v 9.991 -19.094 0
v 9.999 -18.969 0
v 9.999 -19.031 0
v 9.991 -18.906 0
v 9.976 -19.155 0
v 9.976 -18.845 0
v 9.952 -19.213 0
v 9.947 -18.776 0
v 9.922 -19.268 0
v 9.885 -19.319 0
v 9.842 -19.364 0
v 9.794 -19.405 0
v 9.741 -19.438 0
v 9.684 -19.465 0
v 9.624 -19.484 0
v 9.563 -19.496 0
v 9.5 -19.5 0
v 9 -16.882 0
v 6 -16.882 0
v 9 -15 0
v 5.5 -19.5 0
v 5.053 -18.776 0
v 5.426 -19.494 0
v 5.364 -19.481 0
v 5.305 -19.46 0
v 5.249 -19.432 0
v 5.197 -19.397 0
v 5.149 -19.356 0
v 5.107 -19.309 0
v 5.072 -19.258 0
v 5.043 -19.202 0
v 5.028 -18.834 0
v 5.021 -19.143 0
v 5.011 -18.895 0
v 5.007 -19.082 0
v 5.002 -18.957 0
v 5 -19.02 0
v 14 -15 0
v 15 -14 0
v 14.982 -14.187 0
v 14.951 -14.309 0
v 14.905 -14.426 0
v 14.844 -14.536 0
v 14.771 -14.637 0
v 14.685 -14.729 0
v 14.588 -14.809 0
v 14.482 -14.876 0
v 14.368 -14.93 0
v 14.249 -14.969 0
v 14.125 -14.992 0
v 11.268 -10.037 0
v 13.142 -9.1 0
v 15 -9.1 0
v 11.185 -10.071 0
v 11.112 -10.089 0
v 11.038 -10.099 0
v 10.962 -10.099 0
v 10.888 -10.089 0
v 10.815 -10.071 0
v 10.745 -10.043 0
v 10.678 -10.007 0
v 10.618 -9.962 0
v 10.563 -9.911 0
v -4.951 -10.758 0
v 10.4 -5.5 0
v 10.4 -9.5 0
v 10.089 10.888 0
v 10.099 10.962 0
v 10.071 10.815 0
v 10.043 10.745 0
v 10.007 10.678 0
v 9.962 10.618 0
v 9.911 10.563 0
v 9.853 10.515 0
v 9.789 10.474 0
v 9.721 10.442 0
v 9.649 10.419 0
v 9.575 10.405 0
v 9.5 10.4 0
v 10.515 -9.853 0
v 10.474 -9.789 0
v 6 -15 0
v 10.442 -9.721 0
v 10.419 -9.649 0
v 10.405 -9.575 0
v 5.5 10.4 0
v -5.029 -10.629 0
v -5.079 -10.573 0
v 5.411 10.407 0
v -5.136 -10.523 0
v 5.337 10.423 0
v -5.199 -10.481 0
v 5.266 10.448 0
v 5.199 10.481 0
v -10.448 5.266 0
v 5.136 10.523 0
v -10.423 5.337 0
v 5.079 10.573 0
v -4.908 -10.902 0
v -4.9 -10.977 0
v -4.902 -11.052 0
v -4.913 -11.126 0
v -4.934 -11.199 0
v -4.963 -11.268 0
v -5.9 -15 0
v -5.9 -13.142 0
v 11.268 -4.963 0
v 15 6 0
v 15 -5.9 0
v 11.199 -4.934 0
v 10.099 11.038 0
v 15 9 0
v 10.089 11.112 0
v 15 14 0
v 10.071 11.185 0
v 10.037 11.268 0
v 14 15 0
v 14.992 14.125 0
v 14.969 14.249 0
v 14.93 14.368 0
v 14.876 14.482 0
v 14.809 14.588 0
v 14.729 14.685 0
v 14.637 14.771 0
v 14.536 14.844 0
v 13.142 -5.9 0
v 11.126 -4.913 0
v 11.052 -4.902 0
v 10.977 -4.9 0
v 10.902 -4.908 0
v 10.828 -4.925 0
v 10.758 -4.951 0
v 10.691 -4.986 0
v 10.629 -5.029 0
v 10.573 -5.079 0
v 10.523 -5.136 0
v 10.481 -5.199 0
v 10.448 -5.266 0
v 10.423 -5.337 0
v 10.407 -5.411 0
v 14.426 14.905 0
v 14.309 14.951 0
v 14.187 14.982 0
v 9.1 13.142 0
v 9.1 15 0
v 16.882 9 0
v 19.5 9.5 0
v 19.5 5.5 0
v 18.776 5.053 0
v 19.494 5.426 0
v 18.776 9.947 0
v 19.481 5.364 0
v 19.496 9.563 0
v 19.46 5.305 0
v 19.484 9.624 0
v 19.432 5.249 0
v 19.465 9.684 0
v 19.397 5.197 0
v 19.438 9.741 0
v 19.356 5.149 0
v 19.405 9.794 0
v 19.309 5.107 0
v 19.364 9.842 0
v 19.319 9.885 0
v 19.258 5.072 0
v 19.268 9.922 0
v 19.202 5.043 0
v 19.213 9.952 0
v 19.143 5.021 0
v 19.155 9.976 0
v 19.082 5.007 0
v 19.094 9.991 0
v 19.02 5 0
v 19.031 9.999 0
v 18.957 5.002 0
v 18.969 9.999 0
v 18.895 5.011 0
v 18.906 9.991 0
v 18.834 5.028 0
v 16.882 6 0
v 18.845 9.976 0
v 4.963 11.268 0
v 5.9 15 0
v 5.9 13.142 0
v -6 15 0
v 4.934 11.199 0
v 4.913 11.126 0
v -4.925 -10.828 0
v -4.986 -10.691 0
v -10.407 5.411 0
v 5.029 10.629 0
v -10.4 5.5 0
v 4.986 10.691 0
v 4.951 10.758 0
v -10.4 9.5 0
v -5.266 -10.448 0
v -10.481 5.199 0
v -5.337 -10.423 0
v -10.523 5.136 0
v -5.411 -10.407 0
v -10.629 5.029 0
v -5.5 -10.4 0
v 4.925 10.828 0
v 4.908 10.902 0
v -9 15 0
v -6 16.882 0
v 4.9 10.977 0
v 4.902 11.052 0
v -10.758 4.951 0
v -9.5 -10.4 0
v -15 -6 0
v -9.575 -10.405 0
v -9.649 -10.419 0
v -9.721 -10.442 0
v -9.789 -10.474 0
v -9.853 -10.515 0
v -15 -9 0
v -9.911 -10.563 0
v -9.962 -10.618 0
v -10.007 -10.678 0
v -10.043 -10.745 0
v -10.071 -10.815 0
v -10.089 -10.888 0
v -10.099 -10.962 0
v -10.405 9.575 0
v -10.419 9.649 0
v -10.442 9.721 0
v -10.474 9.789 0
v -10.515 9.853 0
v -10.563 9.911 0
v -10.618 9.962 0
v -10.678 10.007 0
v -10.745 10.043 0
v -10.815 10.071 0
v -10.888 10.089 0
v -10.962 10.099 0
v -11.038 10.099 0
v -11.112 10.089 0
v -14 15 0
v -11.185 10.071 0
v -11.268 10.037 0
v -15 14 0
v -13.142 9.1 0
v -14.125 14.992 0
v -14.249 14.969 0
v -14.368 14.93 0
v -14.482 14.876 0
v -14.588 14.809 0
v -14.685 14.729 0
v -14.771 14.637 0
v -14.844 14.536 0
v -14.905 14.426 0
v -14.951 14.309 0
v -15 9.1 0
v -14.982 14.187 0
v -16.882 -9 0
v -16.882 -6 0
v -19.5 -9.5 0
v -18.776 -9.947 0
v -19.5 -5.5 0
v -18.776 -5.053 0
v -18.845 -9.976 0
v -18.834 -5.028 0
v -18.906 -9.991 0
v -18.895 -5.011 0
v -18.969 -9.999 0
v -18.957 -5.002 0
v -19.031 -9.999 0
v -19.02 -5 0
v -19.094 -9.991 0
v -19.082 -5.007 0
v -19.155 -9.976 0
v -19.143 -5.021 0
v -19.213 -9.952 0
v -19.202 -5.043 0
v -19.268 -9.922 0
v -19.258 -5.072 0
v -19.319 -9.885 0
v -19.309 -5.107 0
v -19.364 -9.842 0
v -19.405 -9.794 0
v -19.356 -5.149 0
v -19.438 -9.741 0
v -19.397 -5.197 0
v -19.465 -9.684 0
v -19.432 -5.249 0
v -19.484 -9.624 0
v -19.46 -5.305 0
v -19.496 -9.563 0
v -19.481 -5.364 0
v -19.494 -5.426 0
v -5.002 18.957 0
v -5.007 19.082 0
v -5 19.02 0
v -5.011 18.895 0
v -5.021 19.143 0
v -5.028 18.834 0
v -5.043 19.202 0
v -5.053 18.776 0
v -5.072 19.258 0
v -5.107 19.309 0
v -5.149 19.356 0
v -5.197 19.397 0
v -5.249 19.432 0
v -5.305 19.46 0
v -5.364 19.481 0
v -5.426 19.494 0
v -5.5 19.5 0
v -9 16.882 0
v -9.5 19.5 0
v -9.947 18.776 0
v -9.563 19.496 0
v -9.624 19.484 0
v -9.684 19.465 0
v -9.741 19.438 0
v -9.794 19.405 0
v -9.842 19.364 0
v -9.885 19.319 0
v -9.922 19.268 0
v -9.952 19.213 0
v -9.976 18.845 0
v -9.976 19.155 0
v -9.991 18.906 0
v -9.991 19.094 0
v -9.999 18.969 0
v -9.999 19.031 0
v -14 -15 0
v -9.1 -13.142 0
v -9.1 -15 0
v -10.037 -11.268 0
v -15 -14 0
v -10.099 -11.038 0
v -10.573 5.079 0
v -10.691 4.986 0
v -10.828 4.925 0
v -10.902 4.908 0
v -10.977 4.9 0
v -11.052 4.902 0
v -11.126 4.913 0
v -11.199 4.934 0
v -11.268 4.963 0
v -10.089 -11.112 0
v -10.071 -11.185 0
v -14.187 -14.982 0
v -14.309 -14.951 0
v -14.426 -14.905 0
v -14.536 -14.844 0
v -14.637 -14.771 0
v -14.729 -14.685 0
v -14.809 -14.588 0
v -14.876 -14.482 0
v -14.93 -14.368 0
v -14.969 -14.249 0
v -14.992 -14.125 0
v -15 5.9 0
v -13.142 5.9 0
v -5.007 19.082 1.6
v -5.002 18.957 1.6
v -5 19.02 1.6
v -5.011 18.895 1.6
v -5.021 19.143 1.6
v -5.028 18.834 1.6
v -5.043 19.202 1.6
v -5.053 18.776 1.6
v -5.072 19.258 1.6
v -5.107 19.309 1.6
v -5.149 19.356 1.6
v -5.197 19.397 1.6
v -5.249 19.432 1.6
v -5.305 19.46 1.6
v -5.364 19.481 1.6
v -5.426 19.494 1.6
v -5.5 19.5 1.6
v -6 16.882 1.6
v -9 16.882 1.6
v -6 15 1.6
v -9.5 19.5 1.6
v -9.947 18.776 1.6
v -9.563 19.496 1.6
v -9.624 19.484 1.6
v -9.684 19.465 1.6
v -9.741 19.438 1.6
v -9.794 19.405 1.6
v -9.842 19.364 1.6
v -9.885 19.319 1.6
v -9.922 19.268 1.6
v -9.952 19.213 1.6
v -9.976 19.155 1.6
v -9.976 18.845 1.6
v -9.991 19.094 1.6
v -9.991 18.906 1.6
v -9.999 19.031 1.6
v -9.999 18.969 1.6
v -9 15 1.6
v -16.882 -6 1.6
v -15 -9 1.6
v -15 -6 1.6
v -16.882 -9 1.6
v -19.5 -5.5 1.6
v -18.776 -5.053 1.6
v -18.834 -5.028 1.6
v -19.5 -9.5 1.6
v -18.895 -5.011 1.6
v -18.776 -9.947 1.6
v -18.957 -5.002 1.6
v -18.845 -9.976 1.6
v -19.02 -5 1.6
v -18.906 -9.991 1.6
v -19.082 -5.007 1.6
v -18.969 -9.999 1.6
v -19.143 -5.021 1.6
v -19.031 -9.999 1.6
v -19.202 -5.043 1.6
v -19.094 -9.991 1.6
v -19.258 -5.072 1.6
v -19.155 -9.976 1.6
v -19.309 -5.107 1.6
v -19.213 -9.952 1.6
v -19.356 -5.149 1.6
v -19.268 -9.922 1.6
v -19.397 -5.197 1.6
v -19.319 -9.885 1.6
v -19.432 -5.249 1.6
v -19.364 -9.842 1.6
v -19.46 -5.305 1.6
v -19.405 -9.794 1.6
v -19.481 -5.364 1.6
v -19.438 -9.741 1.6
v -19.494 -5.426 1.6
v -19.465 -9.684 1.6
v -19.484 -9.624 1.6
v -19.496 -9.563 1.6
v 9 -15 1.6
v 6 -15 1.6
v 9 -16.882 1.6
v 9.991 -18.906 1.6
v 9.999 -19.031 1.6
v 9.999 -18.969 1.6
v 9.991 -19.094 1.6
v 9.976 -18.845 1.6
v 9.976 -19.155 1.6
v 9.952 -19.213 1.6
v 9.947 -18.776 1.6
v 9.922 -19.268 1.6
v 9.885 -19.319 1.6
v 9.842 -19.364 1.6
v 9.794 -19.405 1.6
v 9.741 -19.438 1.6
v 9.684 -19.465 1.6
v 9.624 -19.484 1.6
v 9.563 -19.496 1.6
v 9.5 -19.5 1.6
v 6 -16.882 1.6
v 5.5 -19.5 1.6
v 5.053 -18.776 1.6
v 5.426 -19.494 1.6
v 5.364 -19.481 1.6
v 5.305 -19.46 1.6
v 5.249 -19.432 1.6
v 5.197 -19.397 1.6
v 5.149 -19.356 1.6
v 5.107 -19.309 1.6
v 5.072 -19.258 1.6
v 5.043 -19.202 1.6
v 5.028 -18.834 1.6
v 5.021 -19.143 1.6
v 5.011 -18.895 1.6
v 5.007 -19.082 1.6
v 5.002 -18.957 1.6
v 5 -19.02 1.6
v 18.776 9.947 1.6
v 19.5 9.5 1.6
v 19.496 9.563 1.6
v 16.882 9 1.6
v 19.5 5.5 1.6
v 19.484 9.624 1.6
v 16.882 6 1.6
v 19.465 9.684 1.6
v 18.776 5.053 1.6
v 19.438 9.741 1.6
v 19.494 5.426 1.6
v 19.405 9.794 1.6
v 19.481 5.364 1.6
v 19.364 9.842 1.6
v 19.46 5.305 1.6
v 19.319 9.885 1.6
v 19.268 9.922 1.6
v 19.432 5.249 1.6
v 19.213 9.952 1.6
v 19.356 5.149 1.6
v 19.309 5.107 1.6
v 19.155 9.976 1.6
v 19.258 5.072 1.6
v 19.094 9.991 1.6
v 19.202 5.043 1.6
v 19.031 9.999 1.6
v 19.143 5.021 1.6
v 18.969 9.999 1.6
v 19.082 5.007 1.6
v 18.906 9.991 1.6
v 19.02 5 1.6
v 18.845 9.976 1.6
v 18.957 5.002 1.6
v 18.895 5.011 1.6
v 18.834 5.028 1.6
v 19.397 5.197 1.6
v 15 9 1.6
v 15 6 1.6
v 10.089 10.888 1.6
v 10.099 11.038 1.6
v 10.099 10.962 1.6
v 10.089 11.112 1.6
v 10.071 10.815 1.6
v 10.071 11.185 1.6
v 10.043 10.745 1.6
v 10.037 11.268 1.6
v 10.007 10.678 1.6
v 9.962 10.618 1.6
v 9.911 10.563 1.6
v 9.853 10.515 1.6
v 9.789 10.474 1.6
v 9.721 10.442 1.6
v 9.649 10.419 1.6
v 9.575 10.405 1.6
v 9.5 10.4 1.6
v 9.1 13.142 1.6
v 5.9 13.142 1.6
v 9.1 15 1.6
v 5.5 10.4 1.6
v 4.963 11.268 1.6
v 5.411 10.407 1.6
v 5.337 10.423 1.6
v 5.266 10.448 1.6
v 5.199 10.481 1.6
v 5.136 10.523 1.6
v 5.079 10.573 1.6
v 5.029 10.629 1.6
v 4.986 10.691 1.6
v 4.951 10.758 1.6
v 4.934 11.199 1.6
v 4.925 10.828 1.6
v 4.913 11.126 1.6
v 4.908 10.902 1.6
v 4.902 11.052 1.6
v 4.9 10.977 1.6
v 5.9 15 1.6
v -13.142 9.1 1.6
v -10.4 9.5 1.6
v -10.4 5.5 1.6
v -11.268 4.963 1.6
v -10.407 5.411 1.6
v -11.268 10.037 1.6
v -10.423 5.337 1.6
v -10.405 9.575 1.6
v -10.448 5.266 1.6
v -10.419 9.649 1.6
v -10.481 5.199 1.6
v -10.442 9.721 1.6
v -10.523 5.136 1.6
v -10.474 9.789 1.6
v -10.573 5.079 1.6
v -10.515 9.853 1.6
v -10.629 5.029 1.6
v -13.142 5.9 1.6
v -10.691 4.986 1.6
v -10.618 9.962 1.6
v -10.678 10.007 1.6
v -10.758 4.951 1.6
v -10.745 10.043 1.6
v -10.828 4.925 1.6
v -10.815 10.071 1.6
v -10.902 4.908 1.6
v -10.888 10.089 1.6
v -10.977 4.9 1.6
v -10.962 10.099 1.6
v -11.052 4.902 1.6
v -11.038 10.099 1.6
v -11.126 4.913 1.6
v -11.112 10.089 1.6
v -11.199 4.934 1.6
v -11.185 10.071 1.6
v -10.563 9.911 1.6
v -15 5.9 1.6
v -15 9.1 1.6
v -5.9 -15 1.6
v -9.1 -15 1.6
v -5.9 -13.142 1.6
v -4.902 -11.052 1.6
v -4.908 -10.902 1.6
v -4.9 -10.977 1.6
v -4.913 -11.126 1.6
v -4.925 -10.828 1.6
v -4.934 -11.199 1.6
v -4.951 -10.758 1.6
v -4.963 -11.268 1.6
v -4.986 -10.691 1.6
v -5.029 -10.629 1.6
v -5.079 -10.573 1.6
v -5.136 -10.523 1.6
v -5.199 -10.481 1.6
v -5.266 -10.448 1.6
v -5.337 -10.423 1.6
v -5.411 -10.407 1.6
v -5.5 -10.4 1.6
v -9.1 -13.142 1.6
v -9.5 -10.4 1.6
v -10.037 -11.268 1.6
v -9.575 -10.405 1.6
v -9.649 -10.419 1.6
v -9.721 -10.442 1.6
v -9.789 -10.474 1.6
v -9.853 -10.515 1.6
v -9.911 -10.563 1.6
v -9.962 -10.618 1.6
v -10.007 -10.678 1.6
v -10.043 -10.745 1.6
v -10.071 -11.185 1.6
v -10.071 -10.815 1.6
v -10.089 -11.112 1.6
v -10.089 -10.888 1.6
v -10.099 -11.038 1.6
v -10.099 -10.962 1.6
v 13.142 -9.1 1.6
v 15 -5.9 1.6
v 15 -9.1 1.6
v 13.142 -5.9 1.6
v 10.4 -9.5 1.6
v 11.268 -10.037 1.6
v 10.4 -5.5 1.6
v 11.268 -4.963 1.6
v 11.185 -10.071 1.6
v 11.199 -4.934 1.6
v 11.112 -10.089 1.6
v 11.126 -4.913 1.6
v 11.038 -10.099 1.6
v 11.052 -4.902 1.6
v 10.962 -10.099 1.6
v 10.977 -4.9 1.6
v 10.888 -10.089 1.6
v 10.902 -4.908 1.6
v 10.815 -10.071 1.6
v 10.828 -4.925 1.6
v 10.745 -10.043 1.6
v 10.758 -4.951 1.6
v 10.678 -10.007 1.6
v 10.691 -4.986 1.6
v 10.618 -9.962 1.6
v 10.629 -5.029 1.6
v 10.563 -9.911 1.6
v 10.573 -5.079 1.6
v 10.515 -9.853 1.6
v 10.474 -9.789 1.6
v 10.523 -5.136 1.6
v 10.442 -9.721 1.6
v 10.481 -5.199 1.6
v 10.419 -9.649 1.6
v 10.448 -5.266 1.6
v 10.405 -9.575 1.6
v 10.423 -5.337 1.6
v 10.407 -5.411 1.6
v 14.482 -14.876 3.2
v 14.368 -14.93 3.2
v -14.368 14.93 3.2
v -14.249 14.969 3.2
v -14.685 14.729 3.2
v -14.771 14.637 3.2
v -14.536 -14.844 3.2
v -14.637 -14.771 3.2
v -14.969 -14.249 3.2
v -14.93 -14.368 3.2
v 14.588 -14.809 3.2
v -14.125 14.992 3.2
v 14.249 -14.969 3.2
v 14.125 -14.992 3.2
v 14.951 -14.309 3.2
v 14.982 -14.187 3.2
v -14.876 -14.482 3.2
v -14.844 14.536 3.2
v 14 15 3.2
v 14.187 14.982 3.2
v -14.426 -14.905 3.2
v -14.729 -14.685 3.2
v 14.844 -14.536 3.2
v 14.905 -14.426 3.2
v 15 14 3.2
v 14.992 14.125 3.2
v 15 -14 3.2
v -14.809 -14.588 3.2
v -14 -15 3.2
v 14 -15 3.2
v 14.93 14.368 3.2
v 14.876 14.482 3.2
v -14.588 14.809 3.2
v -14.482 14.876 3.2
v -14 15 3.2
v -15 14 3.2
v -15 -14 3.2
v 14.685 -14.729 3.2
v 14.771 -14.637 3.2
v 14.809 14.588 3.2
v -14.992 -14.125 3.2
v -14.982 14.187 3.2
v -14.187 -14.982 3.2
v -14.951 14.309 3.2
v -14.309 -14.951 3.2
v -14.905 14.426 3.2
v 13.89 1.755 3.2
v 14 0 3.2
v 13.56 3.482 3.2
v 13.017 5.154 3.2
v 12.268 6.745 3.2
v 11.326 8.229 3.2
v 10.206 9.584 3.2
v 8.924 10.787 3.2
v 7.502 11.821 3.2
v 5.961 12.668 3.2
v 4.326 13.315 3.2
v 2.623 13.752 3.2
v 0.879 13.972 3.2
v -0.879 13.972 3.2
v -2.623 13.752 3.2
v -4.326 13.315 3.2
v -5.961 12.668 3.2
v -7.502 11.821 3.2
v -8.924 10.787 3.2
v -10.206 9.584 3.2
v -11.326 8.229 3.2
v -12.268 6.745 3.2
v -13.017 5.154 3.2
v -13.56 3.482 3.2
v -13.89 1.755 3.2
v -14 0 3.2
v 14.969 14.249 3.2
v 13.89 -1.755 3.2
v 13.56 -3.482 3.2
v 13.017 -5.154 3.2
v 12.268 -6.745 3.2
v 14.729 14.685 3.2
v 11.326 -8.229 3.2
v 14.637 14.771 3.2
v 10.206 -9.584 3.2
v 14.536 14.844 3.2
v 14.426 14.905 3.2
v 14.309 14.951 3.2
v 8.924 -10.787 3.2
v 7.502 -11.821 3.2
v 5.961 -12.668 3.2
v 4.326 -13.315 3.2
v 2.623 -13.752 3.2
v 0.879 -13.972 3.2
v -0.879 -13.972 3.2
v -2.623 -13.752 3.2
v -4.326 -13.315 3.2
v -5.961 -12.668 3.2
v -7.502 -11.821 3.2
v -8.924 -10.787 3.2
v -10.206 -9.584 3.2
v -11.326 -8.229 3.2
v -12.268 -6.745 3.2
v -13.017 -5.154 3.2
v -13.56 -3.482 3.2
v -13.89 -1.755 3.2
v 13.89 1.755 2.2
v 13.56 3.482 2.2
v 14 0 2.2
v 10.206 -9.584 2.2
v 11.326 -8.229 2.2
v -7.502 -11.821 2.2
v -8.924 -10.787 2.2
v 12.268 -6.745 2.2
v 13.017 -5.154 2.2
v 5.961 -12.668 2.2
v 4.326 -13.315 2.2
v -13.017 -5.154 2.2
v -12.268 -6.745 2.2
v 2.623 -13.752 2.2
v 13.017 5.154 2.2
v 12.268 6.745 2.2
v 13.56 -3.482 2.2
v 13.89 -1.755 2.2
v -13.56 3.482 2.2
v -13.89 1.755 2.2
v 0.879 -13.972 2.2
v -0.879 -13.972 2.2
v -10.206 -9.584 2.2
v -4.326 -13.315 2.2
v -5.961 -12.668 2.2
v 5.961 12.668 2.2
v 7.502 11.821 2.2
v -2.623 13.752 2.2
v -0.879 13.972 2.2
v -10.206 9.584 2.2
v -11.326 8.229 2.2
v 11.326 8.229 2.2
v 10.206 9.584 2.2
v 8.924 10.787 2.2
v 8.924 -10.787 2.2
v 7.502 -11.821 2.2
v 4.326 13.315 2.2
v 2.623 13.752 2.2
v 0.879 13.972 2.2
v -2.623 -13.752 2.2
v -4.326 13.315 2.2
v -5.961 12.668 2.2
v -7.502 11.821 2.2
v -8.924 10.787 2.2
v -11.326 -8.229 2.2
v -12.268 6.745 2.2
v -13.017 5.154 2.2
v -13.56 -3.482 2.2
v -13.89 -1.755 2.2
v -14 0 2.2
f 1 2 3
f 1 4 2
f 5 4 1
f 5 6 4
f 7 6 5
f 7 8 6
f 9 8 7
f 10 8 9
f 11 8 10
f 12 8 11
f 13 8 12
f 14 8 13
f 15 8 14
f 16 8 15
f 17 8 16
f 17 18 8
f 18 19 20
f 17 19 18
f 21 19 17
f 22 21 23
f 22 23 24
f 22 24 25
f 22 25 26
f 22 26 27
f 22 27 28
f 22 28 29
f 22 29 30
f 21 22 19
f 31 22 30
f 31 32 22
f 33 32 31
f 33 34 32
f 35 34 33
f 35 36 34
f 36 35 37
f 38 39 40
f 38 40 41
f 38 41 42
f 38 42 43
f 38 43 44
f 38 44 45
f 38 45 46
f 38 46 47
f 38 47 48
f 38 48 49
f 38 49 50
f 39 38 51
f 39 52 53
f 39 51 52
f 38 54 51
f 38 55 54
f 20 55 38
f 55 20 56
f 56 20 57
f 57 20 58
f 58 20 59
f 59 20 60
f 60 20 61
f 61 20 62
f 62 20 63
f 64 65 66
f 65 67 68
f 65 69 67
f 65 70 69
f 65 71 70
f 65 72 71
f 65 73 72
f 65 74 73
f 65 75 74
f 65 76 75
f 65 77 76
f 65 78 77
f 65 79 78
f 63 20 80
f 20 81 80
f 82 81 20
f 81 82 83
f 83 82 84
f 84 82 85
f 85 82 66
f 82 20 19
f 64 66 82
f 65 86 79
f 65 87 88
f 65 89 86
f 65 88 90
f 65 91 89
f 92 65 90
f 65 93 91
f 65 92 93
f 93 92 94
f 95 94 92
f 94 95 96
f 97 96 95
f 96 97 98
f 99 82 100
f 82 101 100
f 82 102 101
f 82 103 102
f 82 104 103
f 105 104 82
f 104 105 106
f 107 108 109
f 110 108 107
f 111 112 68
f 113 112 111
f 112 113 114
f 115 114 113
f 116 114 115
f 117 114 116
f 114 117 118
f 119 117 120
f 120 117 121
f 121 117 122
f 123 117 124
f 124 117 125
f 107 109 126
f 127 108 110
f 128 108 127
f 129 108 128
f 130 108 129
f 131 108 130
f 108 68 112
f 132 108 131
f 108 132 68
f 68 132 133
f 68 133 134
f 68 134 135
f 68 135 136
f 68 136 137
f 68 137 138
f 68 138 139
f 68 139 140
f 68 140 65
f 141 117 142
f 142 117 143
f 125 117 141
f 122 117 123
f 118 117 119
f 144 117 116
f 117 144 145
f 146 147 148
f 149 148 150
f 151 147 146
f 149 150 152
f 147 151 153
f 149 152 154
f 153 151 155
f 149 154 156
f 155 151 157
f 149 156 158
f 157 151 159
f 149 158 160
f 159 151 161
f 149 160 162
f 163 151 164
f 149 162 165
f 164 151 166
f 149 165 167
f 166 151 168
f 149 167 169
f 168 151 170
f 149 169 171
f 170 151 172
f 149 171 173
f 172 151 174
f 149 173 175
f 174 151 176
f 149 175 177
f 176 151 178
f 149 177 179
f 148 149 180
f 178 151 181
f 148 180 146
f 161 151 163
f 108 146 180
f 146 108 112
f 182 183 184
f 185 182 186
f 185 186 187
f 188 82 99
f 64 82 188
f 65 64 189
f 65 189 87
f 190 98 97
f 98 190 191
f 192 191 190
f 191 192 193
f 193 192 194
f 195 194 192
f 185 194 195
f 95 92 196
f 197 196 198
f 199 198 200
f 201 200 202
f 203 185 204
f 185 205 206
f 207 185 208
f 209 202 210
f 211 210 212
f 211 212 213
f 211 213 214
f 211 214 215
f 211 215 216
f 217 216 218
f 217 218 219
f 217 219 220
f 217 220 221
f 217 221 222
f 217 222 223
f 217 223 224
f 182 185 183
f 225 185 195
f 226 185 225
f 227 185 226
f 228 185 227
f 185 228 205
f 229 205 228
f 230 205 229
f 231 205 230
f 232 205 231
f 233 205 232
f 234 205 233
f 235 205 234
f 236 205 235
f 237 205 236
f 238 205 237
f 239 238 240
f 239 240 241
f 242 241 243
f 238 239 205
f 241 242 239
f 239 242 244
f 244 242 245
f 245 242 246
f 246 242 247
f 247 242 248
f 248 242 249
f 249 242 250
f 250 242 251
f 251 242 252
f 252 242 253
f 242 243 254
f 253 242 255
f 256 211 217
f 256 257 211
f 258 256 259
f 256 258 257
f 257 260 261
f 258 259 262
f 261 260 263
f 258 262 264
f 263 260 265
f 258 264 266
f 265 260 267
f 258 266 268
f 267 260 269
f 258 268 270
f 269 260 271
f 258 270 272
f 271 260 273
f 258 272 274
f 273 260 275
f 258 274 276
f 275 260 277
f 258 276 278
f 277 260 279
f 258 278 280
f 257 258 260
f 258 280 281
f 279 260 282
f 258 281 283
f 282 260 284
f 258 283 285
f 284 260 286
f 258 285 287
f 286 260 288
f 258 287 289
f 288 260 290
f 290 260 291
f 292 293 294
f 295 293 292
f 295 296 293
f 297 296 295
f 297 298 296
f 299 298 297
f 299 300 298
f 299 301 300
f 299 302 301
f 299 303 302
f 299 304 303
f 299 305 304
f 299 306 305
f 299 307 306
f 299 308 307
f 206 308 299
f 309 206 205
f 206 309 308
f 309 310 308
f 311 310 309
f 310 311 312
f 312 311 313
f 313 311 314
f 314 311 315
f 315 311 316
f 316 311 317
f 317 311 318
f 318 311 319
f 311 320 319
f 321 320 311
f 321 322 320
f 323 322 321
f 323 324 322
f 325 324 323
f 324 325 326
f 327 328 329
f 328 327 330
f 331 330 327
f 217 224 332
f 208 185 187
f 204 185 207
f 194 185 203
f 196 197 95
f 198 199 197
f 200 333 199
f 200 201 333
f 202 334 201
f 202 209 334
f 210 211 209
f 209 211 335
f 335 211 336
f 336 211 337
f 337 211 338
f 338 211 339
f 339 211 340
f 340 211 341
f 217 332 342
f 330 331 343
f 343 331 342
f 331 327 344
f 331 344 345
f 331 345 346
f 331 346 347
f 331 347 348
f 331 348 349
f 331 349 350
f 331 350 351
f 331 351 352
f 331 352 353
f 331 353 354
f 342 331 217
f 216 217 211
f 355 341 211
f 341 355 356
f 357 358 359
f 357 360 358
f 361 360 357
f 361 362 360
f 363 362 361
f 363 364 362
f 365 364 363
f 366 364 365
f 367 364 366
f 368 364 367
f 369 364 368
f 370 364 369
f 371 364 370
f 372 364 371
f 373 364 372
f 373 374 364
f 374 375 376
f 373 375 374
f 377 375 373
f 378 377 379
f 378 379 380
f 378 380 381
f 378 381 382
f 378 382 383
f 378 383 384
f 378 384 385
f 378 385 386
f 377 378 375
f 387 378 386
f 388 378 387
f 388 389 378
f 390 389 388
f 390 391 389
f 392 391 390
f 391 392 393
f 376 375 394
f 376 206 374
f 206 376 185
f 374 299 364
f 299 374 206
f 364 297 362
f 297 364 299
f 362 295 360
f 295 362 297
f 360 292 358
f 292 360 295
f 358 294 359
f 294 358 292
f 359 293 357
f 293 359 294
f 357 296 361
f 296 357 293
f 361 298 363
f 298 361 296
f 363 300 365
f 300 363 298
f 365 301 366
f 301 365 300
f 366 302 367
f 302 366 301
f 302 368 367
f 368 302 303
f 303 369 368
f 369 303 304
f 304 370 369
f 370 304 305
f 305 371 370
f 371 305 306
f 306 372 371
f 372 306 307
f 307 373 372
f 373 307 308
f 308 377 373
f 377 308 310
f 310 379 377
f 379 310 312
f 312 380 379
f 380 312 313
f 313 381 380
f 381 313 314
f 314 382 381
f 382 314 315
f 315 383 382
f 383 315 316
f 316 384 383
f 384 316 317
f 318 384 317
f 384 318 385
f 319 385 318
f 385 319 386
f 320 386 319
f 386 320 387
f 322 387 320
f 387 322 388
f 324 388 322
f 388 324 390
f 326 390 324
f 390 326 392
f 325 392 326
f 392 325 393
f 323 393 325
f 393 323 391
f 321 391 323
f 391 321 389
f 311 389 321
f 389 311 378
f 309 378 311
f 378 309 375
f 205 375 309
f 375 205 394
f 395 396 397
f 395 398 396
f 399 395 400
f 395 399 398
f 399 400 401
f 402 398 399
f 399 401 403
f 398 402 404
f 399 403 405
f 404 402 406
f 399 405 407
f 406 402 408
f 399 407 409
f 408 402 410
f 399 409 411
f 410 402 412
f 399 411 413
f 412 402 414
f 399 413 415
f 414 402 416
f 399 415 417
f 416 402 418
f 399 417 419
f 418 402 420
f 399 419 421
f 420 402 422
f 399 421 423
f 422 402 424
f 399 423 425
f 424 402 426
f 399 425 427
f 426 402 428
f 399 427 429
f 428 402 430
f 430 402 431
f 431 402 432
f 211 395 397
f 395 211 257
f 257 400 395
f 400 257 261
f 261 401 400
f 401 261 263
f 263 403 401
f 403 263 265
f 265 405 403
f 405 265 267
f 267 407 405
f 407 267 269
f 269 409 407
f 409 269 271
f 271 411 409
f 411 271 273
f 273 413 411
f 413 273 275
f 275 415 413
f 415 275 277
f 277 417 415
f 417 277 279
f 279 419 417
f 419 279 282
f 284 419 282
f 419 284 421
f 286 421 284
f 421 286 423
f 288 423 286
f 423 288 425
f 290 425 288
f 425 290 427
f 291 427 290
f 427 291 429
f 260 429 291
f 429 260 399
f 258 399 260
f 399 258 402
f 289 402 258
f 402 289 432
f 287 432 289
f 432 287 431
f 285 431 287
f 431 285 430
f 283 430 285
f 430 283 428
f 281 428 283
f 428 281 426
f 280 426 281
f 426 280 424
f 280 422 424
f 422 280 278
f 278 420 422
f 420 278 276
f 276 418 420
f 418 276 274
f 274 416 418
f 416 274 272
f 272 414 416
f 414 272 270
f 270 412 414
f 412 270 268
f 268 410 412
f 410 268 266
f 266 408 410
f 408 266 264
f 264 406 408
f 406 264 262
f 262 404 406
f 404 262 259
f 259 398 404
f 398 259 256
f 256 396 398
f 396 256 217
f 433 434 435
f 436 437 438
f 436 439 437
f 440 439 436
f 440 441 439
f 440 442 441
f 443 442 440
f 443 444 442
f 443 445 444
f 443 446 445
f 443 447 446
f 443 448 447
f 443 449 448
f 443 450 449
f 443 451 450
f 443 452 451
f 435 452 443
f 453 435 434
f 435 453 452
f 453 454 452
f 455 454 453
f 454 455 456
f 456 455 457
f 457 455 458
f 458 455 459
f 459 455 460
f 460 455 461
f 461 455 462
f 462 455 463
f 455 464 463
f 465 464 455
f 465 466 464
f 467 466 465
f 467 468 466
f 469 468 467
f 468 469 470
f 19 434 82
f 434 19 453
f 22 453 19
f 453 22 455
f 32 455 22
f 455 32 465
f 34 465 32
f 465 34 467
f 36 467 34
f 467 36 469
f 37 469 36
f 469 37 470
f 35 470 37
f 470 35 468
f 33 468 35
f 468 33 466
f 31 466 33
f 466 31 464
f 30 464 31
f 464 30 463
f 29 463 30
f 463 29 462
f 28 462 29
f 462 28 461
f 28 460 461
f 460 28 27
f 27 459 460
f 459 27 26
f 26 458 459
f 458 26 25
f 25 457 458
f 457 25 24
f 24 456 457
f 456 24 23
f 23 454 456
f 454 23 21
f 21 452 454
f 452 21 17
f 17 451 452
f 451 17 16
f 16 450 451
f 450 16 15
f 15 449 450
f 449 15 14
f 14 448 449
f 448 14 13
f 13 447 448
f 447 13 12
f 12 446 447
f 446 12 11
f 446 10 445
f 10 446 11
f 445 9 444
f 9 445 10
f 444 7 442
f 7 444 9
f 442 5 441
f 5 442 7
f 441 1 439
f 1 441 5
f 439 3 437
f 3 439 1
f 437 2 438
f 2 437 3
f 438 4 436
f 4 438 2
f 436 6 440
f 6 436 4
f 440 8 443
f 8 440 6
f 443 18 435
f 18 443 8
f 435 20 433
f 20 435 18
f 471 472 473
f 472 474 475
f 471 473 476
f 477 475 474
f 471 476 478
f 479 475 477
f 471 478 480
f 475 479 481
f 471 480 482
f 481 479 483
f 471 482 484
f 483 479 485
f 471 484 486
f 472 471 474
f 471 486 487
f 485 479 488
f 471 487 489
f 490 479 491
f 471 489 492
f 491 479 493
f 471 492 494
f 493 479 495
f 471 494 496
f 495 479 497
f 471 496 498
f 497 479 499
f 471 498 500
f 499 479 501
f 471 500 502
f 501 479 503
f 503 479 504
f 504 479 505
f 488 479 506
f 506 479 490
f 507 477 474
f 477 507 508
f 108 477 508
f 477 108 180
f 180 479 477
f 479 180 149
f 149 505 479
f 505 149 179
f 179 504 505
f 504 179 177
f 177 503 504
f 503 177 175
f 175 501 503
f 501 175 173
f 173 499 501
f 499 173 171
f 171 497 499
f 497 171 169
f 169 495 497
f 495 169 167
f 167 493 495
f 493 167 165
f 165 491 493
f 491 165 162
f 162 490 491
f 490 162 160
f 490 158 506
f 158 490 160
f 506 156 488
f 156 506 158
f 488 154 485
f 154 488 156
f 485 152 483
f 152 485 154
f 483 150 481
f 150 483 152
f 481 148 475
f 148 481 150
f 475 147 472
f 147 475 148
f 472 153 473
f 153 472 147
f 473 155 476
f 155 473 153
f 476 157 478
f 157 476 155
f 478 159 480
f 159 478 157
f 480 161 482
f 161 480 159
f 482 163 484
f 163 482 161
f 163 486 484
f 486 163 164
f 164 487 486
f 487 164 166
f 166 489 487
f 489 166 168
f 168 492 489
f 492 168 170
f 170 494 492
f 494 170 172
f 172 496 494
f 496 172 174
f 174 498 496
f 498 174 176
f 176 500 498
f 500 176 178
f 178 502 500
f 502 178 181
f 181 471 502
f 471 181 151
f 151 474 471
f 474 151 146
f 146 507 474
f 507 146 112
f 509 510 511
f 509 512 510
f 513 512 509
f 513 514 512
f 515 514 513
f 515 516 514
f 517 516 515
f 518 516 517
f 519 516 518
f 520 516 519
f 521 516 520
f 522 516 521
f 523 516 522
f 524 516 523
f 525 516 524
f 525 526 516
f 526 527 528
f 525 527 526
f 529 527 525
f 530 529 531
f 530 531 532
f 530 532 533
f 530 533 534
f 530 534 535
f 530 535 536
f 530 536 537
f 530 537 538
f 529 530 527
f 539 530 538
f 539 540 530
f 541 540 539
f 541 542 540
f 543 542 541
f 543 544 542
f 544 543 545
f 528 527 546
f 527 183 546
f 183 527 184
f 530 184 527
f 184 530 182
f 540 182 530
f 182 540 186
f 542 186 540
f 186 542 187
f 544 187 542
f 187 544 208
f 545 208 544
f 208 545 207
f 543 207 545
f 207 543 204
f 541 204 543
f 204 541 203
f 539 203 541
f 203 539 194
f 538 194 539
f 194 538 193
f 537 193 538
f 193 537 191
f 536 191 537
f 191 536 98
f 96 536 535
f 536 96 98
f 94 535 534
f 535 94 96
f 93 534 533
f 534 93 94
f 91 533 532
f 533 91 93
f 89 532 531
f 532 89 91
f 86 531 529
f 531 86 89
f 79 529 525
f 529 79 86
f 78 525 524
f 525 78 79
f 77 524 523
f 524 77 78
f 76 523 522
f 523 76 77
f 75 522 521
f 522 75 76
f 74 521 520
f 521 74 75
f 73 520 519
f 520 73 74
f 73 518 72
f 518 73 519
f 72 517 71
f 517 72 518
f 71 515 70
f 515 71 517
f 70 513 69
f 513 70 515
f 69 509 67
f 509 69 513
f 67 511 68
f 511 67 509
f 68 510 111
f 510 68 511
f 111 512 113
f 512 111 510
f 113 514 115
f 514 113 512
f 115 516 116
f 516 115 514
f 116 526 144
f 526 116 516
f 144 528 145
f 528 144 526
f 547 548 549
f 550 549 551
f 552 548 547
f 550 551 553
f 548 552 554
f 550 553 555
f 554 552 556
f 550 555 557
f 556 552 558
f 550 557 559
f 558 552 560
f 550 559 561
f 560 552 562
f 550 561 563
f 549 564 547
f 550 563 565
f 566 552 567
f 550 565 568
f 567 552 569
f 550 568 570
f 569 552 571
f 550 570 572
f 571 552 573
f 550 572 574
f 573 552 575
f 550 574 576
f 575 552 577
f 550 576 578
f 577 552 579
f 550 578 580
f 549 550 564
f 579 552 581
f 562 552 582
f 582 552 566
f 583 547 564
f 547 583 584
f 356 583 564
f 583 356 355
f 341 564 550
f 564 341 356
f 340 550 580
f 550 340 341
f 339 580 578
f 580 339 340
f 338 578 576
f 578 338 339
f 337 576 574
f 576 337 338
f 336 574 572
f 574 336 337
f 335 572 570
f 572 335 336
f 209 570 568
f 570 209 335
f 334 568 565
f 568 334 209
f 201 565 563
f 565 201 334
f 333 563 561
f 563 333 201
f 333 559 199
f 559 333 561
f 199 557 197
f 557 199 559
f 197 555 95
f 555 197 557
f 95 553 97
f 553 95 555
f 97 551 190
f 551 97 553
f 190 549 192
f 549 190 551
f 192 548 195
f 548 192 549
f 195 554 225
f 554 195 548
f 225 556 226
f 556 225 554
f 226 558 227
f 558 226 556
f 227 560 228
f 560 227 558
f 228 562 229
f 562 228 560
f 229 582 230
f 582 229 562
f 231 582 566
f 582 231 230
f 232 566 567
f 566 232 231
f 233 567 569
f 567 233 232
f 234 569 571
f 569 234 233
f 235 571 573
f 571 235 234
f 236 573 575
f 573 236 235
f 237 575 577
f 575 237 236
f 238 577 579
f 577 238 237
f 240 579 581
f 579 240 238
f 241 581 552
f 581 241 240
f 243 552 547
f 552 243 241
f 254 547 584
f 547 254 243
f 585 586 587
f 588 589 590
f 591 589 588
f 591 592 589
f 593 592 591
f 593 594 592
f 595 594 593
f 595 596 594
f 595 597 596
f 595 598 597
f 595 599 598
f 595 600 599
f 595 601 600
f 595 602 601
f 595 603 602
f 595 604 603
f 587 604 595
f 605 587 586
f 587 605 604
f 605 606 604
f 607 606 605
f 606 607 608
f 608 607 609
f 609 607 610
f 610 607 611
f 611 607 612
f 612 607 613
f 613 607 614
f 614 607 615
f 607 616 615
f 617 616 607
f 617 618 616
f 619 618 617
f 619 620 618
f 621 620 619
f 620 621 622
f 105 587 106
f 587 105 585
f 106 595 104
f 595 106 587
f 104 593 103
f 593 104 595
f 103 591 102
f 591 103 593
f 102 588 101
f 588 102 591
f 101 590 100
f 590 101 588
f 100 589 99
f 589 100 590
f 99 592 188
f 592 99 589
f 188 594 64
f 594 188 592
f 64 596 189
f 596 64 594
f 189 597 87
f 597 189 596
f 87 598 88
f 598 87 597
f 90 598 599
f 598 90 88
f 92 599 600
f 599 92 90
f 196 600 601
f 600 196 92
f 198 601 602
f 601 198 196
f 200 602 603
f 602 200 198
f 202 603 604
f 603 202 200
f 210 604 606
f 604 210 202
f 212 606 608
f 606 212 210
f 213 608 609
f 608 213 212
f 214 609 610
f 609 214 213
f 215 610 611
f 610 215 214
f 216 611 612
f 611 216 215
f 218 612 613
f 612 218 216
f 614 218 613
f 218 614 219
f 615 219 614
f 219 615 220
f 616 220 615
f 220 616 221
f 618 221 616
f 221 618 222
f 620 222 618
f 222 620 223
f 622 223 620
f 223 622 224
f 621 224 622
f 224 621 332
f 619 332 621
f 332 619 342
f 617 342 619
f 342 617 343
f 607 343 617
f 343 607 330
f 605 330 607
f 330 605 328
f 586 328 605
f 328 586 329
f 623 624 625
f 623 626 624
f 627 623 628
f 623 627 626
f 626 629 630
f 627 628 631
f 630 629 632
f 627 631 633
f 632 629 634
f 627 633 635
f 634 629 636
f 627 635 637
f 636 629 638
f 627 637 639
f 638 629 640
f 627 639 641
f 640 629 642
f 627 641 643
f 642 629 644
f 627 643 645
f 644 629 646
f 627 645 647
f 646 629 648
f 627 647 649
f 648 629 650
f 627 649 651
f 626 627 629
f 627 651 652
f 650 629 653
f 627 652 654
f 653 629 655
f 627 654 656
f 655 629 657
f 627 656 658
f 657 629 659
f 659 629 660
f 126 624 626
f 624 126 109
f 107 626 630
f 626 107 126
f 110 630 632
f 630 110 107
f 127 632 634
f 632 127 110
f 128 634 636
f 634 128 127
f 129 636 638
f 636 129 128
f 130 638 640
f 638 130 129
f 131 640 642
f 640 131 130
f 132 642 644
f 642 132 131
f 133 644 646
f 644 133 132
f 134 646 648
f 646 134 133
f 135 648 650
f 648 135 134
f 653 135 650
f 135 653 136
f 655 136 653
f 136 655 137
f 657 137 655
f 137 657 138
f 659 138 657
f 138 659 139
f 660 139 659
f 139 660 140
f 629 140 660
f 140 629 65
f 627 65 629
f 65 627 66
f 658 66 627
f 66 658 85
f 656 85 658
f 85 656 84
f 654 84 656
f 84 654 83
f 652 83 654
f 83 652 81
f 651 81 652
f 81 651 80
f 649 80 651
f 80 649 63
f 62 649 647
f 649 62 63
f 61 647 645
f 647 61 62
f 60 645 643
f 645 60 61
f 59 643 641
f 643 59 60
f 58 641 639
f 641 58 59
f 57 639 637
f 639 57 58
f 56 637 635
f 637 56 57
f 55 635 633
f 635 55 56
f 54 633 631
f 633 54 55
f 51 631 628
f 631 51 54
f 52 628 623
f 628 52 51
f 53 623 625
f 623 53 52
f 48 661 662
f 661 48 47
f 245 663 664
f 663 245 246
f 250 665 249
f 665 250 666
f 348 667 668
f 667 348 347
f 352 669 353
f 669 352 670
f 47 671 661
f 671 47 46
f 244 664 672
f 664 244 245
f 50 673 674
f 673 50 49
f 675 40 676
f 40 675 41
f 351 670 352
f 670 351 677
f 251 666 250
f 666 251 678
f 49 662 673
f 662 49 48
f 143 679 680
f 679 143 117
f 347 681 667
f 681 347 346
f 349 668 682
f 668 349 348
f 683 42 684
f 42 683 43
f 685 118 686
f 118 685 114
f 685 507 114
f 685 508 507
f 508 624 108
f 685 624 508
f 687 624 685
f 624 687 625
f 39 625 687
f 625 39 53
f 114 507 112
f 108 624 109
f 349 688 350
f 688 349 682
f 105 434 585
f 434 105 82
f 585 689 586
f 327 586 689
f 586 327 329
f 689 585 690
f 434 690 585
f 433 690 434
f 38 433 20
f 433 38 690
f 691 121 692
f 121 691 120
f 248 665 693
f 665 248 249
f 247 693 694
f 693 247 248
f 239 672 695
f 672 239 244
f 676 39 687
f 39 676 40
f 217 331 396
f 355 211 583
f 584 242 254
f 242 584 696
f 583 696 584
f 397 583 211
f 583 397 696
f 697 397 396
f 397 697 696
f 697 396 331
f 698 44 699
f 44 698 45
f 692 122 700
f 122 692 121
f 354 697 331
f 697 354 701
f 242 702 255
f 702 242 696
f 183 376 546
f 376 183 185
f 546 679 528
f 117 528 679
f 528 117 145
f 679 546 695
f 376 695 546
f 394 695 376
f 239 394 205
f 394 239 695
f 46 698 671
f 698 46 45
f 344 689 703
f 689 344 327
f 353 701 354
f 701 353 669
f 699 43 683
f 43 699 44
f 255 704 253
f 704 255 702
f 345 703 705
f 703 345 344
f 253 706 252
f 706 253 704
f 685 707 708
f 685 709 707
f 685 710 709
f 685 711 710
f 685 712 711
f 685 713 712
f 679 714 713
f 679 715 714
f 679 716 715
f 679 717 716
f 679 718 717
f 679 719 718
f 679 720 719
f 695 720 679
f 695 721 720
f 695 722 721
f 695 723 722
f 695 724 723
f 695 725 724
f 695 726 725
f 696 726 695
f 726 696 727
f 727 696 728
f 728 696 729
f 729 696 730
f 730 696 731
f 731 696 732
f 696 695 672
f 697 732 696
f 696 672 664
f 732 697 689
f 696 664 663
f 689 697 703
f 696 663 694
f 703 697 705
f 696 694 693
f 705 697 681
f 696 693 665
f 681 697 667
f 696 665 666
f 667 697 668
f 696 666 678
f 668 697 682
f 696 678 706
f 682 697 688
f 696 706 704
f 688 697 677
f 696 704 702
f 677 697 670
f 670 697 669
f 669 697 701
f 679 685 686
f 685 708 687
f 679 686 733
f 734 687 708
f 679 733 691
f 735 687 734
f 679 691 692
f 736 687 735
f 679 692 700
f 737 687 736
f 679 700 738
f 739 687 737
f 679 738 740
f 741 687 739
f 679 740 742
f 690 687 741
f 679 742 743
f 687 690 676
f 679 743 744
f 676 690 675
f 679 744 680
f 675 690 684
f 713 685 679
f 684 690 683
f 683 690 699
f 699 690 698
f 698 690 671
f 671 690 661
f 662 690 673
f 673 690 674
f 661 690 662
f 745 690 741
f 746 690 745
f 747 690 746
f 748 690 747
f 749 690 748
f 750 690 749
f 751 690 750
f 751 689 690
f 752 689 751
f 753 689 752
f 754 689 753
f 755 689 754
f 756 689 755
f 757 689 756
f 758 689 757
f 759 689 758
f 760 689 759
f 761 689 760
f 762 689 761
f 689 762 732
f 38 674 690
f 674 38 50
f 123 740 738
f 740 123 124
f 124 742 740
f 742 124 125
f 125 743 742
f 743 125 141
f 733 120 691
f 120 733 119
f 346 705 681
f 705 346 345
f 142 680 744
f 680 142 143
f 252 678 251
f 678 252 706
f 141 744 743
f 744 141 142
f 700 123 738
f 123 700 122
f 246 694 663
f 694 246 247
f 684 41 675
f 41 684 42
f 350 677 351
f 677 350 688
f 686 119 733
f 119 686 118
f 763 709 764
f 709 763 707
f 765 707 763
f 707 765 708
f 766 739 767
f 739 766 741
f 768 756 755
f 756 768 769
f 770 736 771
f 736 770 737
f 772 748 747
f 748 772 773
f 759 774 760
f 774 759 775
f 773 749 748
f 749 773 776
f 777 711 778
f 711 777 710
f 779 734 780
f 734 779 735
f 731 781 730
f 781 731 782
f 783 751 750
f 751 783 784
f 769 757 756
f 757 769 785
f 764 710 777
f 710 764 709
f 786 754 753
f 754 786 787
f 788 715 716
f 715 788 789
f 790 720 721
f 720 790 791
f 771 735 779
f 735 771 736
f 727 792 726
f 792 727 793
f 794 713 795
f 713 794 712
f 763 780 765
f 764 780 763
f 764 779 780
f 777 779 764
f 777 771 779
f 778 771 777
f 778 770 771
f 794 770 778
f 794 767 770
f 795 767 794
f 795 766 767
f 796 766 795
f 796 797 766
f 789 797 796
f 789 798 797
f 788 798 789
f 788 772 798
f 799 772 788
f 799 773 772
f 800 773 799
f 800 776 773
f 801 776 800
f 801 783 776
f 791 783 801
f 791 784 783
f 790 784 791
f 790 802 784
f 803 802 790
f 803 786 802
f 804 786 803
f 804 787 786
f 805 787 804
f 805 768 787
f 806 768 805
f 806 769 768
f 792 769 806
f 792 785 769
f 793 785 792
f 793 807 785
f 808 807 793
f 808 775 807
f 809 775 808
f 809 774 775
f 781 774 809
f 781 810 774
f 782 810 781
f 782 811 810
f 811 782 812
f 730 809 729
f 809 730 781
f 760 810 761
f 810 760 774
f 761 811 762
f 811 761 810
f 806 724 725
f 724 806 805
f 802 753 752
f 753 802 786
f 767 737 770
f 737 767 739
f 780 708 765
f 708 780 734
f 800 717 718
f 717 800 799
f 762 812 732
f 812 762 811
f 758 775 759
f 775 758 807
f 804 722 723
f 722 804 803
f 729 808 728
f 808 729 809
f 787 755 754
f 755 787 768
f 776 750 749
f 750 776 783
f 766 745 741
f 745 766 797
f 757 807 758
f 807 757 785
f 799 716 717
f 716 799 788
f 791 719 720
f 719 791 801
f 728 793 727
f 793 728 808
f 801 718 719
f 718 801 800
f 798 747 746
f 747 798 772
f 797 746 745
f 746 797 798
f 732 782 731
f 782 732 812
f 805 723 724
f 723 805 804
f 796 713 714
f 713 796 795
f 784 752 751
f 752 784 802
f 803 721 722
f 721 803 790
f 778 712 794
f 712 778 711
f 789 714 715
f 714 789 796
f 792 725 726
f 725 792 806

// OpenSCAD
// file: variables.scad
BODY_RADIUS = 12.5;
BODY_HEIGHT = 5;
BODY_PADDING = 0.8;
RING_WIDTH = 1.8;
RING_HEIGHT = 1;
RING_ROUND = 0.8;
RING_COUNT = 4;
RING_STEP = BODY_RADIUS / RING_COUNT;

TILE_CIRCLE_RADIUS = 14;
TILE_CIRCLE_DEPTH = 1;
TILE_HEIGHT = 3.2;
TILE_SIZE = 30;
CLIP_CORNER_RADIUS = 0.5;
CLIP_HEIGHT = TILE_HEIGHT/2;
CLIP_LENGTH = 4;
CLIP_WIDTH = 2;
CLIP_CAP_WIDTH = 4;
CLIP_CAP_LENGTH = 2;
// main file
/*
Print settings
  layer height: 0.2
*/

include <variables.scad>;

$fn=50;

module clip(r = CLIP_CORNER_RADIUS) {
  linear_extrude(CLIP_HEIGHT)
    offset(r = r)
        polygon([
          [-CLIP_WIDTH / 2, 0],
          [-CLIP_WIDTH / 2, CLIP_LENGTH - CLIP_CAP_LENGTH],
          [-CLIP_CAP_WIDTH / 2, CLIP_LENGTH],
          [CLIP_CAP_WIDTH / 2, CLIP_LENGTH],
          [CLIP_WIDTH / 2, CLIP_LENGTH - CLIP_CAP_LENGTH],
          [CLIP_WIDTH / 2, 0]
        ]);
}

module tile() {
  for (a=[0:90:270]) rotate([0, 0, a]) translate([-TILE_SIZE/4, TILE_SIZE/2, 0]) clip();
  difference() {
    translate([-TILE_SIZE/2, -TILE_SIZE/2, 0]) linear_extrude(TILE_HEIGHT) offset(r=1) offset(delta=-1) square(TILE_SIZE, TILE_SIZE);
    translate([0, 0, TILE_HEIGHT - TILE_CIRCLE_DEPTH]) linear_extrude(TILE_CIRCLE_DEPTH) circle(TILE_CIRCLE_RADIUS);
    for (a=[0:90:270]) rotate([0, 0, a]) translate([TILE_SIZE/4, TILE_SIZE/2, 0]) rotate([0,0,180]) clip(CLIP_CORNER_RADIUS + 0.1);
  }
}

tile();
